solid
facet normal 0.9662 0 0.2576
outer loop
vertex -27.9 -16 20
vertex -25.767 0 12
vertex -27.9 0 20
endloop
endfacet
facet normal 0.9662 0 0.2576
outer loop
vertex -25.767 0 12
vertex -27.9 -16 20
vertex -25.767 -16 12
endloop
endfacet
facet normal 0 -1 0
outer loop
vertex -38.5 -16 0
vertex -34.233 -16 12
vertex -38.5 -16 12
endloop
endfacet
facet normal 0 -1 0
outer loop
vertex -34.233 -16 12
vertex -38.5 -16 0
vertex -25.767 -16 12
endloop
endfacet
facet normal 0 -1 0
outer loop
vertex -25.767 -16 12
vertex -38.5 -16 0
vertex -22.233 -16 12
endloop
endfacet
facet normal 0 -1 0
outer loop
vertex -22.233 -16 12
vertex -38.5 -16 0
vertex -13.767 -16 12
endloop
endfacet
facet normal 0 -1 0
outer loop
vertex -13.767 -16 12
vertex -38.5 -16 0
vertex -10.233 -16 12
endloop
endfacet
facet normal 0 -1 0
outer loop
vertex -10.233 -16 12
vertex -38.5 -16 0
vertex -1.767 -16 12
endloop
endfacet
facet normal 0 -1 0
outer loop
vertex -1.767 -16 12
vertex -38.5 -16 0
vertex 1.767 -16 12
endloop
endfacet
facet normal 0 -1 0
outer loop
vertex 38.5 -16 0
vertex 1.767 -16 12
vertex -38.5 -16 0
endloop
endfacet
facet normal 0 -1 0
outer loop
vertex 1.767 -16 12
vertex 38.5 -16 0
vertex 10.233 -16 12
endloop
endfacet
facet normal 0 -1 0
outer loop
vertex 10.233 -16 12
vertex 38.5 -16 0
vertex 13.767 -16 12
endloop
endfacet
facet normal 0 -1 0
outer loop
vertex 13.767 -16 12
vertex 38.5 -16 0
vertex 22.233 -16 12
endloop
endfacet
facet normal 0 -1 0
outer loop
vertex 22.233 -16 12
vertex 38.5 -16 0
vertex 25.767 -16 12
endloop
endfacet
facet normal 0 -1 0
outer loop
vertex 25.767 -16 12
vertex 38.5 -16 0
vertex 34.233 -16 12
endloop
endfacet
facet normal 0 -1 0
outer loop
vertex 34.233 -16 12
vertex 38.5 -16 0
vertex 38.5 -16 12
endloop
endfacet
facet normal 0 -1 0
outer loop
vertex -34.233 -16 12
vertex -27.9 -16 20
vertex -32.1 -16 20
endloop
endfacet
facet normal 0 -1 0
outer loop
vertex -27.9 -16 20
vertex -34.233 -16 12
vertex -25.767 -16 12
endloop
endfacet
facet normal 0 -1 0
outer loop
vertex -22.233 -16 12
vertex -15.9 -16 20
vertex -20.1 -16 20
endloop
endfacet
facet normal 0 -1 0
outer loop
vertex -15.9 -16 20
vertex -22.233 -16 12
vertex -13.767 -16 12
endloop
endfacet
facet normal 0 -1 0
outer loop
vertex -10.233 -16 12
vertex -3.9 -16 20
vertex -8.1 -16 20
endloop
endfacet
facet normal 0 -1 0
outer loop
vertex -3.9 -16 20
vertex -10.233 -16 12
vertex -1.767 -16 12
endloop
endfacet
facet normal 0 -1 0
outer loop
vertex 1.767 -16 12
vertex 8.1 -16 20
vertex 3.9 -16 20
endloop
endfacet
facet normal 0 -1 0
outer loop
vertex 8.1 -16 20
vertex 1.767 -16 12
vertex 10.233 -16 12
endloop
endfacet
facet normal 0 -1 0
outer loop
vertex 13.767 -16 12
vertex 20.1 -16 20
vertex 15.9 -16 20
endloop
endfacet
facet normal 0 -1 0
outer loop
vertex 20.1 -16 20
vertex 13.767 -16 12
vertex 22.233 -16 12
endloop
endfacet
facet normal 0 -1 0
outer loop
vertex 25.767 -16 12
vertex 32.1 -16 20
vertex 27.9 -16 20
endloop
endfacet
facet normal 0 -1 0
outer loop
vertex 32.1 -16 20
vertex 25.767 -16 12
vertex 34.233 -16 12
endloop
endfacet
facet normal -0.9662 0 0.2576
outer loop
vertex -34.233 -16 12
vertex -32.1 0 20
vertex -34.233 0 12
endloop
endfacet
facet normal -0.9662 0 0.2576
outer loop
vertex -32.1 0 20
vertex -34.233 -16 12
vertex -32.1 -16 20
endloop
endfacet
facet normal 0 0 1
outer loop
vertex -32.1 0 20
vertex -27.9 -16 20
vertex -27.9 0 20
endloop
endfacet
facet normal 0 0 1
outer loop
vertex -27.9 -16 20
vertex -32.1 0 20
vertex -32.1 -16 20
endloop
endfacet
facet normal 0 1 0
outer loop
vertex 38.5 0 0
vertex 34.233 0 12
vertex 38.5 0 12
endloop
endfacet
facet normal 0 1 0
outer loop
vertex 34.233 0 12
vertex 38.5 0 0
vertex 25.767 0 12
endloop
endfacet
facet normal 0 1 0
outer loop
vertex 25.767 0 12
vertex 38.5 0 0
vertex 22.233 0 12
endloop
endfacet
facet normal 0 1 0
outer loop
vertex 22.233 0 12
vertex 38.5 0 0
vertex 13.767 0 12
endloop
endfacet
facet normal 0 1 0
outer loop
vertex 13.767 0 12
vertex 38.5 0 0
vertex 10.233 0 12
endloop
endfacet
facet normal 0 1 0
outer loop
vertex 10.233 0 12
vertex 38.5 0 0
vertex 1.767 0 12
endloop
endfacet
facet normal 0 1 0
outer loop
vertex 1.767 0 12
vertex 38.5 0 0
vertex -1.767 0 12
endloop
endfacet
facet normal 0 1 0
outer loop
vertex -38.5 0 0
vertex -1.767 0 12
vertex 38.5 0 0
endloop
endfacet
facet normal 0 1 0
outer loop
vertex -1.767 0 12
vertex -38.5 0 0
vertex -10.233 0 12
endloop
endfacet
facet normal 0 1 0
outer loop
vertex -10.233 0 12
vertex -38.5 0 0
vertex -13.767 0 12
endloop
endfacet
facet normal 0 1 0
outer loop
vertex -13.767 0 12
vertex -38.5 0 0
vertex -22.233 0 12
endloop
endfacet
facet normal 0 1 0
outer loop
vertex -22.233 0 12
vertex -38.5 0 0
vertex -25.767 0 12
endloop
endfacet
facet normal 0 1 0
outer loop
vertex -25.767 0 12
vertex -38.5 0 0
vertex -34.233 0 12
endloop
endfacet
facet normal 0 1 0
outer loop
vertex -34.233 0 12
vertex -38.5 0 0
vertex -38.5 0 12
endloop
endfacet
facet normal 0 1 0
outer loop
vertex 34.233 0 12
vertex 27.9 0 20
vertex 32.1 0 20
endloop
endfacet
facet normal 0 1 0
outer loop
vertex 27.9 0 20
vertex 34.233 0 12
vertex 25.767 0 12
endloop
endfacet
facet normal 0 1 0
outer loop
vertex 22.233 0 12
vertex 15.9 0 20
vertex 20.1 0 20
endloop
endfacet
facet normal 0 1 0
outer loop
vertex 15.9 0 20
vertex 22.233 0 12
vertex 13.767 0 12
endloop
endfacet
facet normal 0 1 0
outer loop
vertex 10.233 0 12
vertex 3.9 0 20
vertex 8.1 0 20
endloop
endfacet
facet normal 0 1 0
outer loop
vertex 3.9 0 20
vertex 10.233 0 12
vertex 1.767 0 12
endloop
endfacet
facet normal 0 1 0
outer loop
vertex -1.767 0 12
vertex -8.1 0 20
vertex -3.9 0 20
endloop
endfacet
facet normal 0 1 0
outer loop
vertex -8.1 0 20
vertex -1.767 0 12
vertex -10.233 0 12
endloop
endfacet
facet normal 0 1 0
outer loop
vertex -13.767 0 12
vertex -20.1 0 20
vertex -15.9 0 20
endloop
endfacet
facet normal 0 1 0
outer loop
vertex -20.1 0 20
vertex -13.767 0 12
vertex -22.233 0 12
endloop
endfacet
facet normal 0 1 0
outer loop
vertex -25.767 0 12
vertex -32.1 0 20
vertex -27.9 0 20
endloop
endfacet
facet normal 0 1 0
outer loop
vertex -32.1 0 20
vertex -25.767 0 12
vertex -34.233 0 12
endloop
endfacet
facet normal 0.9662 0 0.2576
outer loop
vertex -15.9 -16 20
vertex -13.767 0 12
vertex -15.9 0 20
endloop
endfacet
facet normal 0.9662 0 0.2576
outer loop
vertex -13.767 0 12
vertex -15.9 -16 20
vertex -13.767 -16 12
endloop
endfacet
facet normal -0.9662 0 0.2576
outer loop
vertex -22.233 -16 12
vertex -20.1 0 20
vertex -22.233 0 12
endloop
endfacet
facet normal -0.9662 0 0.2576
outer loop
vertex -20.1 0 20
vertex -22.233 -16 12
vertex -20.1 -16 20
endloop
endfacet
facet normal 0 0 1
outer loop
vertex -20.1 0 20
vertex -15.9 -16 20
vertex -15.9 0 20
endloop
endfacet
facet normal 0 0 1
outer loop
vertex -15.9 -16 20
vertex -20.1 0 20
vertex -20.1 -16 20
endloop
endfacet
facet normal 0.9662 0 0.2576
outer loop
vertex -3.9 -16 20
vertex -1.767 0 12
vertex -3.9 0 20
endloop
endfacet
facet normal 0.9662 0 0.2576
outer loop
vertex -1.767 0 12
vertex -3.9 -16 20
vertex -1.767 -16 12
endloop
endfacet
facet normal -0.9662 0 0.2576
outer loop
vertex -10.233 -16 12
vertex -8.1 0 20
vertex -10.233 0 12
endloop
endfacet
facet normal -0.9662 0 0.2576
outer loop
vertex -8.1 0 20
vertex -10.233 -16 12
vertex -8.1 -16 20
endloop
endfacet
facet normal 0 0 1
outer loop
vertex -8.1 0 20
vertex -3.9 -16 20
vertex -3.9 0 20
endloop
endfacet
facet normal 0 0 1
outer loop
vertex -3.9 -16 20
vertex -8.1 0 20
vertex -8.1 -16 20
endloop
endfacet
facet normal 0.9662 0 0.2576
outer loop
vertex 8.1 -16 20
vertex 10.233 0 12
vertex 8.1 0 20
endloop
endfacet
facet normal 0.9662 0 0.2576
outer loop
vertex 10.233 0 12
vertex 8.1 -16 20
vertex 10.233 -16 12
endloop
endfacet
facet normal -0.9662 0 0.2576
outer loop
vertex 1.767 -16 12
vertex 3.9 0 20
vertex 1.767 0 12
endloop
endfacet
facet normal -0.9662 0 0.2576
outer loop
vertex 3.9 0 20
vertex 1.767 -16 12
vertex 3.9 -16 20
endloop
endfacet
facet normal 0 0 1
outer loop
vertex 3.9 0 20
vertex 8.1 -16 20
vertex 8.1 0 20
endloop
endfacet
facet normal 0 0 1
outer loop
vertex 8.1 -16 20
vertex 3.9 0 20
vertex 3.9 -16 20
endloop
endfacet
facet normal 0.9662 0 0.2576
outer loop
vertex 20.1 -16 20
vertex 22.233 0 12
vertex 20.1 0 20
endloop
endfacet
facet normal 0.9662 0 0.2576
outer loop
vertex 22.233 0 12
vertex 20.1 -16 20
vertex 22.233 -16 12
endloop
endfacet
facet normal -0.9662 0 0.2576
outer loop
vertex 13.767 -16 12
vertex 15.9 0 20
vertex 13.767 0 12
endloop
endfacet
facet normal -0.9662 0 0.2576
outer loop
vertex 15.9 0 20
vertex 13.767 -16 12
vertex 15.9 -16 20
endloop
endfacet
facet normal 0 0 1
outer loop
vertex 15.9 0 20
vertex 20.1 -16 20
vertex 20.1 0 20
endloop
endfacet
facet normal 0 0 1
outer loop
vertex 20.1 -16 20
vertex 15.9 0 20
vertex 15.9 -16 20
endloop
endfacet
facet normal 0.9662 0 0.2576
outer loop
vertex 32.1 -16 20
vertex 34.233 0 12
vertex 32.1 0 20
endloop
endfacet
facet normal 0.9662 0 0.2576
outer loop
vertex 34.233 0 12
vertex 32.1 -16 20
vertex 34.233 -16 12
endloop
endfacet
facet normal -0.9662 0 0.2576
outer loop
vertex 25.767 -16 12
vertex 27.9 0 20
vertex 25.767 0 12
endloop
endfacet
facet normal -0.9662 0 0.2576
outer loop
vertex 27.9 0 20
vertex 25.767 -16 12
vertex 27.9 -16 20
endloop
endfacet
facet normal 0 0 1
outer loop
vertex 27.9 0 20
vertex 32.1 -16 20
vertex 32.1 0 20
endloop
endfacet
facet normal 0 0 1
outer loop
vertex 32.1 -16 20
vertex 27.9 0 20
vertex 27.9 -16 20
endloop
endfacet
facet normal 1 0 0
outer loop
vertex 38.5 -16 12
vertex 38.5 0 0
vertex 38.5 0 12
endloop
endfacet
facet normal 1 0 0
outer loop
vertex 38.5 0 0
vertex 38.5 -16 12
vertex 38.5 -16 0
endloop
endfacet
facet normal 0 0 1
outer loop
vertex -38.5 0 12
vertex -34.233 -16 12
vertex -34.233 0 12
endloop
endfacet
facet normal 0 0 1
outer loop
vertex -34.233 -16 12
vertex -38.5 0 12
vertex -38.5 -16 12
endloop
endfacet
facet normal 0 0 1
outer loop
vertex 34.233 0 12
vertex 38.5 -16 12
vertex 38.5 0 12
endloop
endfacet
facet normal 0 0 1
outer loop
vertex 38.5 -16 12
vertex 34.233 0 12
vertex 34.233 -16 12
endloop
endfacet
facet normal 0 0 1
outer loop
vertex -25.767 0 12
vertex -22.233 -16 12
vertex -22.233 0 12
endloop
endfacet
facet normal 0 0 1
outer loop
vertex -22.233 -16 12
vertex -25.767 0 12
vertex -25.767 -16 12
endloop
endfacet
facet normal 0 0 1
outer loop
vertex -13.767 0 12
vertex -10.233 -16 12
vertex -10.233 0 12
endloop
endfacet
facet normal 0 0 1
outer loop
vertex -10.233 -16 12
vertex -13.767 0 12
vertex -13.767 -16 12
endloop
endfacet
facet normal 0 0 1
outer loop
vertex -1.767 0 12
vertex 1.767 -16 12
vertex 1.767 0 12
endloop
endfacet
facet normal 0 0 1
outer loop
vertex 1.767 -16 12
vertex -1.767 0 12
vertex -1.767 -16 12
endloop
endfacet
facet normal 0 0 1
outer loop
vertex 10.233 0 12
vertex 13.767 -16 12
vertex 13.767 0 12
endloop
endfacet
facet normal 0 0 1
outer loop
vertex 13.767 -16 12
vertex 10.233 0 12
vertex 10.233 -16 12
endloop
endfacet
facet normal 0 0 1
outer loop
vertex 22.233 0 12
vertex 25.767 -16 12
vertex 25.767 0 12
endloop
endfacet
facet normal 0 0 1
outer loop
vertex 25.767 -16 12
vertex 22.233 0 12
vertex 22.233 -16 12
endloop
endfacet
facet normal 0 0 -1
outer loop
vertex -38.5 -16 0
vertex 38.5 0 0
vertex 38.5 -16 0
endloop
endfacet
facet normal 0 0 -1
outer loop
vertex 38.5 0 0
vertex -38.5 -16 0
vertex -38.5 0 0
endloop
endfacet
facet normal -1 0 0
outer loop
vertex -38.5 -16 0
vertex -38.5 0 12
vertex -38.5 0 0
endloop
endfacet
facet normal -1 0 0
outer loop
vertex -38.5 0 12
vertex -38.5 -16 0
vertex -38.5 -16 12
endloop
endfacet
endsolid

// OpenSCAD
$fn = 32;

// ----------------------------------------------------------------------
// Toothed rack, 6 teeth
// 12 mm pitch, 8 mm teeth
// ----------------------------------------------------------------------

// --- parameters (mm) ---
bar_w = 16;     // bar width (Y)
bar_h = 12;     // bar height (Z)
teeth = 6;      // number of teeth
pitch = 12;     // tooth pitch
tooth_h = 8;    // tooth height above the bar
root_w = 9;     // tooth width at the root
crest_w = 4.2;  // tooth width at the crest

// --- derived feature positions (mm) ---
span = (teeth - 1) * pitch;  // = 60   distance between the outer teeth
bar_l = span + root_w + 8;   // = 77   bar length: teeth plus 4 mm at each end
tooth_x = -span / 2;         // = -30   X of the first tooth
height = bar_h + tooth_h;    // = 20   overall height
feature_centers = [
  [tooth_x + 0 * pitch, -bar_w / 2],
  [tooth_x + 1 * pitch, -bar_w / 2],
  [tooth_x + 2 * pitch, -bar_w / 2],
  [tooth_x + 3 * pitch, -bar_w / 2],
  [tooth_x + 4 * pitch, -bar_w / 2],
  [tooth_x + 5 * pitch, -bar_w / 2]
];   // tooth centre line, drives the tooth loop

// bar with a rack of teeth, one extruded trapezoium per centre
module rack_tooth() {
  linear_extrude(height = bar_w)
    polygon(points = [
      [0, 0],
      [root_w, 0],
      [root_w / 2 + crest_w / 2, tooth_h + 1],
      [root_w / 2 - crest_w / 2, tooth_h + 1]
    ]);
}

union() {
  translate([-bar_l / 2, -bar_w, 0]) cube([bar_l, bar_w, bar_h]);
  for (centre = feature_centers)
    translate([centre[0] - root_w / 2, 0, bar_h - 1]) rotate([90, 0, 0]) rack_tooth();
}
